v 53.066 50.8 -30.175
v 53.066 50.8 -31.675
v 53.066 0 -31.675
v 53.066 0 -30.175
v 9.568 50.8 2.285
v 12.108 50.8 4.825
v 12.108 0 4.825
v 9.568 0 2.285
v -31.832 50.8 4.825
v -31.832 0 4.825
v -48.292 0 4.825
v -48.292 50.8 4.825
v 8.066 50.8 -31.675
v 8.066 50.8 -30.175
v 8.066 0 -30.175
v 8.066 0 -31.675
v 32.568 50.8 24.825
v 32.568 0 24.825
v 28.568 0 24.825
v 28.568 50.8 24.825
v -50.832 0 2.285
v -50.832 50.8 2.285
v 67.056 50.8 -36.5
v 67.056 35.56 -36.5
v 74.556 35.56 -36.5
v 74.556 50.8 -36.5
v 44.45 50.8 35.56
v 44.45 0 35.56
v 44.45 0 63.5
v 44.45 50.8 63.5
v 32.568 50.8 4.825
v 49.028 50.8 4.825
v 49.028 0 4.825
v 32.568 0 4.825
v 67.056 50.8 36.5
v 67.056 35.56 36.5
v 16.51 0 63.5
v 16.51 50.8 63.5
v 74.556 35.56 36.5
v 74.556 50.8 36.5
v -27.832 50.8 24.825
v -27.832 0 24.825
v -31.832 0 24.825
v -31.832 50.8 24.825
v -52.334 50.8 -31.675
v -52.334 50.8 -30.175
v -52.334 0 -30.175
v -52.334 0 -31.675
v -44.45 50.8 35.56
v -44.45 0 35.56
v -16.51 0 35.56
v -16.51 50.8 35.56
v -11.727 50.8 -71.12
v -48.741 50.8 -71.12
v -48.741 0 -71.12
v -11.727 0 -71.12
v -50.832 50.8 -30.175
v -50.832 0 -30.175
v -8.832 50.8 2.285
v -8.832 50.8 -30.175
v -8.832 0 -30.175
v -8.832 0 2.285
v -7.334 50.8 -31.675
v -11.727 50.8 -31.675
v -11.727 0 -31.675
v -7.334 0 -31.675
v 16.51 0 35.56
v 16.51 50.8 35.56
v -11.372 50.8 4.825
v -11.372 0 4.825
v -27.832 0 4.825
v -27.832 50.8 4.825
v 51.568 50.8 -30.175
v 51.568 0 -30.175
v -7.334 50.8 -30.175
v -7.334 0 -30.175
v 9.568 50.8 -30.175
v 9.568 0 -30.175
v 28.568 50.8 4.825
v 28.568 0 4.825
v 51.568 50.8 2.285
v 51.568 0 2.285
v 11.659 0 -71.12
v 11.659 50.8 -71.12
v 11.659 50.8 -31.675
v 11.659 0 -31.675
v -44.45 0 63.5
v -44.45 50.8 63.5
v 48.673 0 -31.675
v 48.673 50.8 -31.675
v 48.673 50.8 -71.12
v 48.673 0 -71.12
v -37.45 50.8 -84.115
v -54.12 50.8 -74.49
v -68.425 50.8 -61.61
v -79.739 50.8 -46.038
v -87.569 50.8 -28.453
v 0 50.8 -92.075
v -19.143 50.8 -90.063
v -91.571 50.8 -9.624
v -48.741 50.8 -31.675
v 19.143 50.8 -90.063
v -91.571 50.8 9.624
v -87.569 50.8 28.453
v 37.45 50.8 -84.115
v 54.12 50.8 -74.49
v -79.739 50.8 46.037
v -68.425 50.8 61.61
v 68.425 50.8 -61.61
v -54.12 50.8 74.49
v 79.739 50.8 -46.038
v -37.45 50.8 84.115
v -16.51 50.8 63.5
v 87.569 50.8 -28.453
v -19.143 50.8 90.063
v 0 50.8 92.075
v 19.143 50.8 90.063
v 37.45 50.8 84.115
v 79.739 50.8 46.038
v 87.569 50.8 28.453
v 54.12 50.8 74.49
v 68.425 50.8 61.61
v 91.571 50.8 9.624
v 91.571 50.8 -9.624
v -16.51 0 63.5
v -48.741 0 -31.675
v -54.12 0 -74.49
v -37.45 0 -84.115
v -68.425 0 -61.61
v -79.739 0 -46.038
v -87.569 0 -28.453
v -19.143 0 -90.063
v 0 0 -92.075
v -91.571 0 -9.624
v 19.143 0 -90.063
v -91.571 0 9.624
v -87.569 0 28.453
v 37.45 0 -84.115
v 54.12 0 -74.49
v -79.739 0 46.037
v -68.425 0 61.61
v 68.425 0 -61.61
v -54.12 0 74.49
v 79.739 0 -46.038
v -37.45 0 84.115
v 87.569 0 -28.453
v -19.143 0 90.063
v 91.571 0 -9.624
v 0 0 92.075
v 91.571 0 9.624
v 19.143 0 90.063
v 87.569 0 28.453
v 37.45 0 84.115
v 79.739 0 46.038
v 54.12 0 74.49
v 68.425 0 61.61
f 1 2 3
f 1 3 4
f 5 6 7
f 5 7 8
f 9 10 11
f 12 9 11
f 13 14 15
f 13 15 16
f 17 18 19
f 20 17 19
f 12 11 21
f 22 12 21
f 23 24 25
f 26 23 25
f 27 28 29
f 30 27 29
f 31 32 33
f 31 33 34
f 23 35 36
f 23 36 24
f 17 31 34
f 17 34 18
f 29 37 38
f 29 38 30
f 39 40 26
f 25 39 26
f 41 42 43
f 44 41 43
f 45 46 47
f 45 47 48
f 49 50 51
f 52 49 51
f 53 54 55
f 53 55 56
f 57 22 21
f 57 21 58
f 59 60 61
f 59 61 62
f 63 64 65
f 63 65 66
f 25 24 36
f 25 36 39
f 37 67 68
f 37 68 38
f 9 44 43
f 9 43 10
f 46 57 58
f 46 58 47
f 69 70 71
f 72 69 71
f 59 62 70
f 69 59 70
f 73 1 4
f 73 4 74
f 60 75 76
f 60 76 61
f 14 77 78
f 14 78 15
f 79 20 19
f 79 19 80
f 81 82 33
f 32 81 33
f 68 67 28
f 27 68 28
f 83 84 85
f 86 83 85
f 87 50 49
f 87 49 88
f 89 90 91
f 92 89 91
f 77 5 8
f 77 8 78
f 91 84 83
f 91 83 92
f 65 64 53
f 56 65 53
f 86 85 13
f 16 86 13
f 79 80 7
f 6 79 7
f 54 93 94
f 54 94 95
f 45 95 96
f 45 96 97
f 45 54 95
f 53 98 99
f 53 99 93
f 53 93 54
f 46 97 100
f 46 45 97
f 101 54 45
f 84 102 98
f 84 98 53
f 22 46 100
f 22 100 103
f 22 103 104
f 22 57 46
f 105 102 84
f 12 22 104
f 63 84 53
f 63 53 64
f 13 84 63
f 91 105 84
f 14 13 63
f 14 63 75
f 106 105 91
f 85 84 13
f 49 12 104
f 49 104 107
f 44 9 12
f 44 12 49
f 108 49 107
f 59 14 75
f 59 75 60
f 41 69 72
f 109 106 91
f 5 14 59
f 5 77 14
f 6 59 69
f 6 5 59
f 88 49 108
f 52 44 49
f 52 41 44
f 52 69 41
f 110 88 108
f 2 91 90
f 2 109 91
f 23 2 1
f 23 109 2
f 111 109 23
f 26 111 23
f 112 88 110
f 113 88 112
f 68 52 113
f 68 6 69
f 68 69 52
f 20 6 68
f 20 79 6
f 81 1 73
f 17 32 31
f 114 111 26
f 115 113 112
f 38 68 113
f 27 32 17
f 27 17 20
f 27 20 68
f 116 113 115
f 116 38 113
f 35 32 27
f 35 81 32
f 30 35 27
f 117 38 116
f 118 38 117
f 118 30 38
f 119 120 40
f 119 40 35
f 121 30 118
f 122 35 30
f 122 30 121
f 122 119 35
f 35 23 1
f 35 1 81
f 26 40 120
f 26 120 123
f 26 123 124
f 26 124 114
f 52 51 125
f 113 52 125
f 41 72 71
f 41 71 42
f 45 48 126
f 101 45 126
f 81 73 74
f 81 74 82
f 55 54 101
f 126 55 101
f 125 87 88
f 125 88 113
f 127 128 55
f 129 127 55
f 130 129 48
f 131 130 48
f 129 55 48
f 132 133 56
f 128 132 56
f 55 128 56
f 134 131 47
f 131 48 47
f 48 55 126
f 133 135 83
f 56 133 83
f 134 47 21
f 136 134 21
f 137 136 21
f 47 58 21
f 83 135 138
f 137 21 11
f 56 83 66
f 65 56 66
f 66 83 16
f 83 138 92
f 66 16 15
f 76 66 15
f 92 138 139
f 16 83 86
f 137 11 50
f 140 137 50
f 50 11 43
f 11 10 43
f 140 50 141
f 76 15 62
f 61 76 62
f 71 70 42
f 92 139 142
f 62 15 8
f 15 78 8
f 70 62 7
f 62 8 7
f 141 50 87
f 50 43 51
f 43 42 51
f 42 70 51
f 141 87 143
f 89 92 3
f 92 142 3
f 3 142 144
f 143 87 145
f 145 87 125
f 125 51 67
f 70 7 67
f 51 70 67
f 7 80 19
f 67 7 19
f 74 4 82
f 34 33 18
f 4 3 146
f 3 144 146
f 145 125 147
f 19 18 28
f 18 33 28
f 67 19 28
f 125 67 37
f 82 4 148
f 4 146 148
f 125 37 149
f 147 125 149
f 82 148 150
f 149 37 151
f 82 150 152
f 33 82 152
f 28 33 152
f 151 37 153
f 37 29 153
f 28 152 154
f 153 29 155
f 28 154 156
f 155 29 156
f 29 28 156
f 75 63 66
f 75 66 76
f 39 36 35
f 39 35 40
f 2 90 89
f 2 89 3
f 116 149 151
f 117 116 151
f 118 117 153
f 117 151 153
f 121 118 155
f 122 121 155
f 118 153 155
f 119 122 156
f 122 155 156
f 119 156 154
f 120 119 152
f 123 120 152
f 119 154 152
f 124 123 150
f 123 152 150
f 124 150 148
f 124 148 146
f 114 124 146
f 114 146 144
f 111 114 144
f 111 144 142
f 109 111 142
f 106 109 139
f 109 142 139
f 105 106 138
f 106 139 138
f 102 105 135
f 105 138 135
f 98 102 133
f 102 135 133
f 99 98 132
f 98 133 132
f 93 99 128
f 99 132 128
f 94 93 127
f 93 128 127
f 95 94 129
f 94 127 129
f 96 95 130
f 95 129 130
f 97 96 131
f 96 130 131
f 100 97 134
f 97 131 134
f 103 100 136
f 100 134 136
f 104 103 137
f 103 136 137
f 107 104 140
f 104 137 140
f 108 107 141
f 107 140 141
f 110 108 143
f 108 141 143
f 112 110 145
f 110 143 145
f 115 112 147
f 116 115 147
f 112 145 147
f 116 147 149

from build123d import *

# Parameters (mm, degrees)
SKETCH1_R           = 92.075
BOSS_EXTRUDE1_DEPTH = 50.8
SKETCH6_W           = 27.94
SKETCH6_H           = 27.94
CUT_EXTRUDE4_DEPTH  = 50.8
CUT_EXTRUDE5_DEPTH  = 50.8
SKETCH10_W          = 7.5
SKETCH10_H          = 73
CUT_EXTRUDE7_DEPTH  = 15.24


with BuildPart() as part:
    # Sketch1 → Boss-Extrude1 (new body)
    with BuildSketch(Plane(origin=(0, 0, 0), x_dir=(1, 0, 0), z_dir=(0, 1, 0))):
        with Locations(Location((0, 0, 0), (0, 0, 270))):
            Circle(SKETCH1_R)
    extrude(amount=BOSS_EXTRUDE1_DEPTH)

    # Sketch6 → Cut-Extrude4 (cut)
    with BuildSketch(Plane.XZ):
        with Locations((30.48, 49.53)):
            Rectangle(SKETCH6_W, SKETCH6_H)
        with Locations((-30.48, 49.53)):
            Rectangle(SKETCH6_W, SKETCH6_H)
    extrude(amount=-CUT_EXTRUDE4_DEPTH, mode=Mode.SUBTRACT)

    # Sketch8 → Cut-Extrude5 (cut)
    with BuildSketch(Plane(origin=(0, 50.8, 0), x_dir=(1, 0, 0), z_dir=(0, 1, 0))):
        Polygon((48.673227998, 66.920620093), (48.673227998, 31.675), (53.066023648, 31.675), (53.066023648, 30.175), (51.568299971, 30.175), (51.568299971, -2.285), (49.028299971, -4.825), (32.568299971, -4.825), (32.568299971, -24.825), (28.568299971, -24.825), (28.568299971, -4.825), (12.108299971, -4.825), (9.568299971, -2.285), (9.568299971, 30.175), (8.06602381, 30.175), (8.06602381, 31.675), (10.838299971, 31.675), (11.658892904, 31.675), (11.658892904, 66.920620093), (11.658892904, 71.12), (48.673227998, 71.12), align=None)
        Polygon((-8.831700029, -2.285), (-11.371700029, -4.825), (-27.831700029, -4.825), (-27.831700029, -24.825), (-31.831700029, -24.825), (-31.831700029, -4.825), (-48.291700029, -4.825), (-50.831700029, -2.285), (-50.831700029, 30.175), (-52.33397619, 30.175), (-52.33397619, 31.675), (-48.741107096, 31.675), (-48.741107096, 66.920620093), (-48.741107096, 71.12), (-11.726772002, 71.12), (-11.726772002, 66.920620093), (-11.726772002, 31.675), (-7.333976352, 31.675), (-7.333976352, 30.175), (-8.831700029, 30.175), align=None)
    extrude(amount=-CUT_EXTRUDE5_DEPTH, mode=Mode.SUBTRACT)

    # Sketch10 → Cut-Extrude7 (cut)
    with BuildSketch(Plane(origin=(0, 50.8, 0), x_dir=(1, 0, 0), z_dir=(0, 1, 0))):
        with Locations((70.806, 0)):
            Rectangle(SKETCH10_W, SKETCH10_H)
    extrude(amount=-CUT_EXTRUDE7_DEPTH, mode=Mode.SUBTRACT)


solid = part.part
